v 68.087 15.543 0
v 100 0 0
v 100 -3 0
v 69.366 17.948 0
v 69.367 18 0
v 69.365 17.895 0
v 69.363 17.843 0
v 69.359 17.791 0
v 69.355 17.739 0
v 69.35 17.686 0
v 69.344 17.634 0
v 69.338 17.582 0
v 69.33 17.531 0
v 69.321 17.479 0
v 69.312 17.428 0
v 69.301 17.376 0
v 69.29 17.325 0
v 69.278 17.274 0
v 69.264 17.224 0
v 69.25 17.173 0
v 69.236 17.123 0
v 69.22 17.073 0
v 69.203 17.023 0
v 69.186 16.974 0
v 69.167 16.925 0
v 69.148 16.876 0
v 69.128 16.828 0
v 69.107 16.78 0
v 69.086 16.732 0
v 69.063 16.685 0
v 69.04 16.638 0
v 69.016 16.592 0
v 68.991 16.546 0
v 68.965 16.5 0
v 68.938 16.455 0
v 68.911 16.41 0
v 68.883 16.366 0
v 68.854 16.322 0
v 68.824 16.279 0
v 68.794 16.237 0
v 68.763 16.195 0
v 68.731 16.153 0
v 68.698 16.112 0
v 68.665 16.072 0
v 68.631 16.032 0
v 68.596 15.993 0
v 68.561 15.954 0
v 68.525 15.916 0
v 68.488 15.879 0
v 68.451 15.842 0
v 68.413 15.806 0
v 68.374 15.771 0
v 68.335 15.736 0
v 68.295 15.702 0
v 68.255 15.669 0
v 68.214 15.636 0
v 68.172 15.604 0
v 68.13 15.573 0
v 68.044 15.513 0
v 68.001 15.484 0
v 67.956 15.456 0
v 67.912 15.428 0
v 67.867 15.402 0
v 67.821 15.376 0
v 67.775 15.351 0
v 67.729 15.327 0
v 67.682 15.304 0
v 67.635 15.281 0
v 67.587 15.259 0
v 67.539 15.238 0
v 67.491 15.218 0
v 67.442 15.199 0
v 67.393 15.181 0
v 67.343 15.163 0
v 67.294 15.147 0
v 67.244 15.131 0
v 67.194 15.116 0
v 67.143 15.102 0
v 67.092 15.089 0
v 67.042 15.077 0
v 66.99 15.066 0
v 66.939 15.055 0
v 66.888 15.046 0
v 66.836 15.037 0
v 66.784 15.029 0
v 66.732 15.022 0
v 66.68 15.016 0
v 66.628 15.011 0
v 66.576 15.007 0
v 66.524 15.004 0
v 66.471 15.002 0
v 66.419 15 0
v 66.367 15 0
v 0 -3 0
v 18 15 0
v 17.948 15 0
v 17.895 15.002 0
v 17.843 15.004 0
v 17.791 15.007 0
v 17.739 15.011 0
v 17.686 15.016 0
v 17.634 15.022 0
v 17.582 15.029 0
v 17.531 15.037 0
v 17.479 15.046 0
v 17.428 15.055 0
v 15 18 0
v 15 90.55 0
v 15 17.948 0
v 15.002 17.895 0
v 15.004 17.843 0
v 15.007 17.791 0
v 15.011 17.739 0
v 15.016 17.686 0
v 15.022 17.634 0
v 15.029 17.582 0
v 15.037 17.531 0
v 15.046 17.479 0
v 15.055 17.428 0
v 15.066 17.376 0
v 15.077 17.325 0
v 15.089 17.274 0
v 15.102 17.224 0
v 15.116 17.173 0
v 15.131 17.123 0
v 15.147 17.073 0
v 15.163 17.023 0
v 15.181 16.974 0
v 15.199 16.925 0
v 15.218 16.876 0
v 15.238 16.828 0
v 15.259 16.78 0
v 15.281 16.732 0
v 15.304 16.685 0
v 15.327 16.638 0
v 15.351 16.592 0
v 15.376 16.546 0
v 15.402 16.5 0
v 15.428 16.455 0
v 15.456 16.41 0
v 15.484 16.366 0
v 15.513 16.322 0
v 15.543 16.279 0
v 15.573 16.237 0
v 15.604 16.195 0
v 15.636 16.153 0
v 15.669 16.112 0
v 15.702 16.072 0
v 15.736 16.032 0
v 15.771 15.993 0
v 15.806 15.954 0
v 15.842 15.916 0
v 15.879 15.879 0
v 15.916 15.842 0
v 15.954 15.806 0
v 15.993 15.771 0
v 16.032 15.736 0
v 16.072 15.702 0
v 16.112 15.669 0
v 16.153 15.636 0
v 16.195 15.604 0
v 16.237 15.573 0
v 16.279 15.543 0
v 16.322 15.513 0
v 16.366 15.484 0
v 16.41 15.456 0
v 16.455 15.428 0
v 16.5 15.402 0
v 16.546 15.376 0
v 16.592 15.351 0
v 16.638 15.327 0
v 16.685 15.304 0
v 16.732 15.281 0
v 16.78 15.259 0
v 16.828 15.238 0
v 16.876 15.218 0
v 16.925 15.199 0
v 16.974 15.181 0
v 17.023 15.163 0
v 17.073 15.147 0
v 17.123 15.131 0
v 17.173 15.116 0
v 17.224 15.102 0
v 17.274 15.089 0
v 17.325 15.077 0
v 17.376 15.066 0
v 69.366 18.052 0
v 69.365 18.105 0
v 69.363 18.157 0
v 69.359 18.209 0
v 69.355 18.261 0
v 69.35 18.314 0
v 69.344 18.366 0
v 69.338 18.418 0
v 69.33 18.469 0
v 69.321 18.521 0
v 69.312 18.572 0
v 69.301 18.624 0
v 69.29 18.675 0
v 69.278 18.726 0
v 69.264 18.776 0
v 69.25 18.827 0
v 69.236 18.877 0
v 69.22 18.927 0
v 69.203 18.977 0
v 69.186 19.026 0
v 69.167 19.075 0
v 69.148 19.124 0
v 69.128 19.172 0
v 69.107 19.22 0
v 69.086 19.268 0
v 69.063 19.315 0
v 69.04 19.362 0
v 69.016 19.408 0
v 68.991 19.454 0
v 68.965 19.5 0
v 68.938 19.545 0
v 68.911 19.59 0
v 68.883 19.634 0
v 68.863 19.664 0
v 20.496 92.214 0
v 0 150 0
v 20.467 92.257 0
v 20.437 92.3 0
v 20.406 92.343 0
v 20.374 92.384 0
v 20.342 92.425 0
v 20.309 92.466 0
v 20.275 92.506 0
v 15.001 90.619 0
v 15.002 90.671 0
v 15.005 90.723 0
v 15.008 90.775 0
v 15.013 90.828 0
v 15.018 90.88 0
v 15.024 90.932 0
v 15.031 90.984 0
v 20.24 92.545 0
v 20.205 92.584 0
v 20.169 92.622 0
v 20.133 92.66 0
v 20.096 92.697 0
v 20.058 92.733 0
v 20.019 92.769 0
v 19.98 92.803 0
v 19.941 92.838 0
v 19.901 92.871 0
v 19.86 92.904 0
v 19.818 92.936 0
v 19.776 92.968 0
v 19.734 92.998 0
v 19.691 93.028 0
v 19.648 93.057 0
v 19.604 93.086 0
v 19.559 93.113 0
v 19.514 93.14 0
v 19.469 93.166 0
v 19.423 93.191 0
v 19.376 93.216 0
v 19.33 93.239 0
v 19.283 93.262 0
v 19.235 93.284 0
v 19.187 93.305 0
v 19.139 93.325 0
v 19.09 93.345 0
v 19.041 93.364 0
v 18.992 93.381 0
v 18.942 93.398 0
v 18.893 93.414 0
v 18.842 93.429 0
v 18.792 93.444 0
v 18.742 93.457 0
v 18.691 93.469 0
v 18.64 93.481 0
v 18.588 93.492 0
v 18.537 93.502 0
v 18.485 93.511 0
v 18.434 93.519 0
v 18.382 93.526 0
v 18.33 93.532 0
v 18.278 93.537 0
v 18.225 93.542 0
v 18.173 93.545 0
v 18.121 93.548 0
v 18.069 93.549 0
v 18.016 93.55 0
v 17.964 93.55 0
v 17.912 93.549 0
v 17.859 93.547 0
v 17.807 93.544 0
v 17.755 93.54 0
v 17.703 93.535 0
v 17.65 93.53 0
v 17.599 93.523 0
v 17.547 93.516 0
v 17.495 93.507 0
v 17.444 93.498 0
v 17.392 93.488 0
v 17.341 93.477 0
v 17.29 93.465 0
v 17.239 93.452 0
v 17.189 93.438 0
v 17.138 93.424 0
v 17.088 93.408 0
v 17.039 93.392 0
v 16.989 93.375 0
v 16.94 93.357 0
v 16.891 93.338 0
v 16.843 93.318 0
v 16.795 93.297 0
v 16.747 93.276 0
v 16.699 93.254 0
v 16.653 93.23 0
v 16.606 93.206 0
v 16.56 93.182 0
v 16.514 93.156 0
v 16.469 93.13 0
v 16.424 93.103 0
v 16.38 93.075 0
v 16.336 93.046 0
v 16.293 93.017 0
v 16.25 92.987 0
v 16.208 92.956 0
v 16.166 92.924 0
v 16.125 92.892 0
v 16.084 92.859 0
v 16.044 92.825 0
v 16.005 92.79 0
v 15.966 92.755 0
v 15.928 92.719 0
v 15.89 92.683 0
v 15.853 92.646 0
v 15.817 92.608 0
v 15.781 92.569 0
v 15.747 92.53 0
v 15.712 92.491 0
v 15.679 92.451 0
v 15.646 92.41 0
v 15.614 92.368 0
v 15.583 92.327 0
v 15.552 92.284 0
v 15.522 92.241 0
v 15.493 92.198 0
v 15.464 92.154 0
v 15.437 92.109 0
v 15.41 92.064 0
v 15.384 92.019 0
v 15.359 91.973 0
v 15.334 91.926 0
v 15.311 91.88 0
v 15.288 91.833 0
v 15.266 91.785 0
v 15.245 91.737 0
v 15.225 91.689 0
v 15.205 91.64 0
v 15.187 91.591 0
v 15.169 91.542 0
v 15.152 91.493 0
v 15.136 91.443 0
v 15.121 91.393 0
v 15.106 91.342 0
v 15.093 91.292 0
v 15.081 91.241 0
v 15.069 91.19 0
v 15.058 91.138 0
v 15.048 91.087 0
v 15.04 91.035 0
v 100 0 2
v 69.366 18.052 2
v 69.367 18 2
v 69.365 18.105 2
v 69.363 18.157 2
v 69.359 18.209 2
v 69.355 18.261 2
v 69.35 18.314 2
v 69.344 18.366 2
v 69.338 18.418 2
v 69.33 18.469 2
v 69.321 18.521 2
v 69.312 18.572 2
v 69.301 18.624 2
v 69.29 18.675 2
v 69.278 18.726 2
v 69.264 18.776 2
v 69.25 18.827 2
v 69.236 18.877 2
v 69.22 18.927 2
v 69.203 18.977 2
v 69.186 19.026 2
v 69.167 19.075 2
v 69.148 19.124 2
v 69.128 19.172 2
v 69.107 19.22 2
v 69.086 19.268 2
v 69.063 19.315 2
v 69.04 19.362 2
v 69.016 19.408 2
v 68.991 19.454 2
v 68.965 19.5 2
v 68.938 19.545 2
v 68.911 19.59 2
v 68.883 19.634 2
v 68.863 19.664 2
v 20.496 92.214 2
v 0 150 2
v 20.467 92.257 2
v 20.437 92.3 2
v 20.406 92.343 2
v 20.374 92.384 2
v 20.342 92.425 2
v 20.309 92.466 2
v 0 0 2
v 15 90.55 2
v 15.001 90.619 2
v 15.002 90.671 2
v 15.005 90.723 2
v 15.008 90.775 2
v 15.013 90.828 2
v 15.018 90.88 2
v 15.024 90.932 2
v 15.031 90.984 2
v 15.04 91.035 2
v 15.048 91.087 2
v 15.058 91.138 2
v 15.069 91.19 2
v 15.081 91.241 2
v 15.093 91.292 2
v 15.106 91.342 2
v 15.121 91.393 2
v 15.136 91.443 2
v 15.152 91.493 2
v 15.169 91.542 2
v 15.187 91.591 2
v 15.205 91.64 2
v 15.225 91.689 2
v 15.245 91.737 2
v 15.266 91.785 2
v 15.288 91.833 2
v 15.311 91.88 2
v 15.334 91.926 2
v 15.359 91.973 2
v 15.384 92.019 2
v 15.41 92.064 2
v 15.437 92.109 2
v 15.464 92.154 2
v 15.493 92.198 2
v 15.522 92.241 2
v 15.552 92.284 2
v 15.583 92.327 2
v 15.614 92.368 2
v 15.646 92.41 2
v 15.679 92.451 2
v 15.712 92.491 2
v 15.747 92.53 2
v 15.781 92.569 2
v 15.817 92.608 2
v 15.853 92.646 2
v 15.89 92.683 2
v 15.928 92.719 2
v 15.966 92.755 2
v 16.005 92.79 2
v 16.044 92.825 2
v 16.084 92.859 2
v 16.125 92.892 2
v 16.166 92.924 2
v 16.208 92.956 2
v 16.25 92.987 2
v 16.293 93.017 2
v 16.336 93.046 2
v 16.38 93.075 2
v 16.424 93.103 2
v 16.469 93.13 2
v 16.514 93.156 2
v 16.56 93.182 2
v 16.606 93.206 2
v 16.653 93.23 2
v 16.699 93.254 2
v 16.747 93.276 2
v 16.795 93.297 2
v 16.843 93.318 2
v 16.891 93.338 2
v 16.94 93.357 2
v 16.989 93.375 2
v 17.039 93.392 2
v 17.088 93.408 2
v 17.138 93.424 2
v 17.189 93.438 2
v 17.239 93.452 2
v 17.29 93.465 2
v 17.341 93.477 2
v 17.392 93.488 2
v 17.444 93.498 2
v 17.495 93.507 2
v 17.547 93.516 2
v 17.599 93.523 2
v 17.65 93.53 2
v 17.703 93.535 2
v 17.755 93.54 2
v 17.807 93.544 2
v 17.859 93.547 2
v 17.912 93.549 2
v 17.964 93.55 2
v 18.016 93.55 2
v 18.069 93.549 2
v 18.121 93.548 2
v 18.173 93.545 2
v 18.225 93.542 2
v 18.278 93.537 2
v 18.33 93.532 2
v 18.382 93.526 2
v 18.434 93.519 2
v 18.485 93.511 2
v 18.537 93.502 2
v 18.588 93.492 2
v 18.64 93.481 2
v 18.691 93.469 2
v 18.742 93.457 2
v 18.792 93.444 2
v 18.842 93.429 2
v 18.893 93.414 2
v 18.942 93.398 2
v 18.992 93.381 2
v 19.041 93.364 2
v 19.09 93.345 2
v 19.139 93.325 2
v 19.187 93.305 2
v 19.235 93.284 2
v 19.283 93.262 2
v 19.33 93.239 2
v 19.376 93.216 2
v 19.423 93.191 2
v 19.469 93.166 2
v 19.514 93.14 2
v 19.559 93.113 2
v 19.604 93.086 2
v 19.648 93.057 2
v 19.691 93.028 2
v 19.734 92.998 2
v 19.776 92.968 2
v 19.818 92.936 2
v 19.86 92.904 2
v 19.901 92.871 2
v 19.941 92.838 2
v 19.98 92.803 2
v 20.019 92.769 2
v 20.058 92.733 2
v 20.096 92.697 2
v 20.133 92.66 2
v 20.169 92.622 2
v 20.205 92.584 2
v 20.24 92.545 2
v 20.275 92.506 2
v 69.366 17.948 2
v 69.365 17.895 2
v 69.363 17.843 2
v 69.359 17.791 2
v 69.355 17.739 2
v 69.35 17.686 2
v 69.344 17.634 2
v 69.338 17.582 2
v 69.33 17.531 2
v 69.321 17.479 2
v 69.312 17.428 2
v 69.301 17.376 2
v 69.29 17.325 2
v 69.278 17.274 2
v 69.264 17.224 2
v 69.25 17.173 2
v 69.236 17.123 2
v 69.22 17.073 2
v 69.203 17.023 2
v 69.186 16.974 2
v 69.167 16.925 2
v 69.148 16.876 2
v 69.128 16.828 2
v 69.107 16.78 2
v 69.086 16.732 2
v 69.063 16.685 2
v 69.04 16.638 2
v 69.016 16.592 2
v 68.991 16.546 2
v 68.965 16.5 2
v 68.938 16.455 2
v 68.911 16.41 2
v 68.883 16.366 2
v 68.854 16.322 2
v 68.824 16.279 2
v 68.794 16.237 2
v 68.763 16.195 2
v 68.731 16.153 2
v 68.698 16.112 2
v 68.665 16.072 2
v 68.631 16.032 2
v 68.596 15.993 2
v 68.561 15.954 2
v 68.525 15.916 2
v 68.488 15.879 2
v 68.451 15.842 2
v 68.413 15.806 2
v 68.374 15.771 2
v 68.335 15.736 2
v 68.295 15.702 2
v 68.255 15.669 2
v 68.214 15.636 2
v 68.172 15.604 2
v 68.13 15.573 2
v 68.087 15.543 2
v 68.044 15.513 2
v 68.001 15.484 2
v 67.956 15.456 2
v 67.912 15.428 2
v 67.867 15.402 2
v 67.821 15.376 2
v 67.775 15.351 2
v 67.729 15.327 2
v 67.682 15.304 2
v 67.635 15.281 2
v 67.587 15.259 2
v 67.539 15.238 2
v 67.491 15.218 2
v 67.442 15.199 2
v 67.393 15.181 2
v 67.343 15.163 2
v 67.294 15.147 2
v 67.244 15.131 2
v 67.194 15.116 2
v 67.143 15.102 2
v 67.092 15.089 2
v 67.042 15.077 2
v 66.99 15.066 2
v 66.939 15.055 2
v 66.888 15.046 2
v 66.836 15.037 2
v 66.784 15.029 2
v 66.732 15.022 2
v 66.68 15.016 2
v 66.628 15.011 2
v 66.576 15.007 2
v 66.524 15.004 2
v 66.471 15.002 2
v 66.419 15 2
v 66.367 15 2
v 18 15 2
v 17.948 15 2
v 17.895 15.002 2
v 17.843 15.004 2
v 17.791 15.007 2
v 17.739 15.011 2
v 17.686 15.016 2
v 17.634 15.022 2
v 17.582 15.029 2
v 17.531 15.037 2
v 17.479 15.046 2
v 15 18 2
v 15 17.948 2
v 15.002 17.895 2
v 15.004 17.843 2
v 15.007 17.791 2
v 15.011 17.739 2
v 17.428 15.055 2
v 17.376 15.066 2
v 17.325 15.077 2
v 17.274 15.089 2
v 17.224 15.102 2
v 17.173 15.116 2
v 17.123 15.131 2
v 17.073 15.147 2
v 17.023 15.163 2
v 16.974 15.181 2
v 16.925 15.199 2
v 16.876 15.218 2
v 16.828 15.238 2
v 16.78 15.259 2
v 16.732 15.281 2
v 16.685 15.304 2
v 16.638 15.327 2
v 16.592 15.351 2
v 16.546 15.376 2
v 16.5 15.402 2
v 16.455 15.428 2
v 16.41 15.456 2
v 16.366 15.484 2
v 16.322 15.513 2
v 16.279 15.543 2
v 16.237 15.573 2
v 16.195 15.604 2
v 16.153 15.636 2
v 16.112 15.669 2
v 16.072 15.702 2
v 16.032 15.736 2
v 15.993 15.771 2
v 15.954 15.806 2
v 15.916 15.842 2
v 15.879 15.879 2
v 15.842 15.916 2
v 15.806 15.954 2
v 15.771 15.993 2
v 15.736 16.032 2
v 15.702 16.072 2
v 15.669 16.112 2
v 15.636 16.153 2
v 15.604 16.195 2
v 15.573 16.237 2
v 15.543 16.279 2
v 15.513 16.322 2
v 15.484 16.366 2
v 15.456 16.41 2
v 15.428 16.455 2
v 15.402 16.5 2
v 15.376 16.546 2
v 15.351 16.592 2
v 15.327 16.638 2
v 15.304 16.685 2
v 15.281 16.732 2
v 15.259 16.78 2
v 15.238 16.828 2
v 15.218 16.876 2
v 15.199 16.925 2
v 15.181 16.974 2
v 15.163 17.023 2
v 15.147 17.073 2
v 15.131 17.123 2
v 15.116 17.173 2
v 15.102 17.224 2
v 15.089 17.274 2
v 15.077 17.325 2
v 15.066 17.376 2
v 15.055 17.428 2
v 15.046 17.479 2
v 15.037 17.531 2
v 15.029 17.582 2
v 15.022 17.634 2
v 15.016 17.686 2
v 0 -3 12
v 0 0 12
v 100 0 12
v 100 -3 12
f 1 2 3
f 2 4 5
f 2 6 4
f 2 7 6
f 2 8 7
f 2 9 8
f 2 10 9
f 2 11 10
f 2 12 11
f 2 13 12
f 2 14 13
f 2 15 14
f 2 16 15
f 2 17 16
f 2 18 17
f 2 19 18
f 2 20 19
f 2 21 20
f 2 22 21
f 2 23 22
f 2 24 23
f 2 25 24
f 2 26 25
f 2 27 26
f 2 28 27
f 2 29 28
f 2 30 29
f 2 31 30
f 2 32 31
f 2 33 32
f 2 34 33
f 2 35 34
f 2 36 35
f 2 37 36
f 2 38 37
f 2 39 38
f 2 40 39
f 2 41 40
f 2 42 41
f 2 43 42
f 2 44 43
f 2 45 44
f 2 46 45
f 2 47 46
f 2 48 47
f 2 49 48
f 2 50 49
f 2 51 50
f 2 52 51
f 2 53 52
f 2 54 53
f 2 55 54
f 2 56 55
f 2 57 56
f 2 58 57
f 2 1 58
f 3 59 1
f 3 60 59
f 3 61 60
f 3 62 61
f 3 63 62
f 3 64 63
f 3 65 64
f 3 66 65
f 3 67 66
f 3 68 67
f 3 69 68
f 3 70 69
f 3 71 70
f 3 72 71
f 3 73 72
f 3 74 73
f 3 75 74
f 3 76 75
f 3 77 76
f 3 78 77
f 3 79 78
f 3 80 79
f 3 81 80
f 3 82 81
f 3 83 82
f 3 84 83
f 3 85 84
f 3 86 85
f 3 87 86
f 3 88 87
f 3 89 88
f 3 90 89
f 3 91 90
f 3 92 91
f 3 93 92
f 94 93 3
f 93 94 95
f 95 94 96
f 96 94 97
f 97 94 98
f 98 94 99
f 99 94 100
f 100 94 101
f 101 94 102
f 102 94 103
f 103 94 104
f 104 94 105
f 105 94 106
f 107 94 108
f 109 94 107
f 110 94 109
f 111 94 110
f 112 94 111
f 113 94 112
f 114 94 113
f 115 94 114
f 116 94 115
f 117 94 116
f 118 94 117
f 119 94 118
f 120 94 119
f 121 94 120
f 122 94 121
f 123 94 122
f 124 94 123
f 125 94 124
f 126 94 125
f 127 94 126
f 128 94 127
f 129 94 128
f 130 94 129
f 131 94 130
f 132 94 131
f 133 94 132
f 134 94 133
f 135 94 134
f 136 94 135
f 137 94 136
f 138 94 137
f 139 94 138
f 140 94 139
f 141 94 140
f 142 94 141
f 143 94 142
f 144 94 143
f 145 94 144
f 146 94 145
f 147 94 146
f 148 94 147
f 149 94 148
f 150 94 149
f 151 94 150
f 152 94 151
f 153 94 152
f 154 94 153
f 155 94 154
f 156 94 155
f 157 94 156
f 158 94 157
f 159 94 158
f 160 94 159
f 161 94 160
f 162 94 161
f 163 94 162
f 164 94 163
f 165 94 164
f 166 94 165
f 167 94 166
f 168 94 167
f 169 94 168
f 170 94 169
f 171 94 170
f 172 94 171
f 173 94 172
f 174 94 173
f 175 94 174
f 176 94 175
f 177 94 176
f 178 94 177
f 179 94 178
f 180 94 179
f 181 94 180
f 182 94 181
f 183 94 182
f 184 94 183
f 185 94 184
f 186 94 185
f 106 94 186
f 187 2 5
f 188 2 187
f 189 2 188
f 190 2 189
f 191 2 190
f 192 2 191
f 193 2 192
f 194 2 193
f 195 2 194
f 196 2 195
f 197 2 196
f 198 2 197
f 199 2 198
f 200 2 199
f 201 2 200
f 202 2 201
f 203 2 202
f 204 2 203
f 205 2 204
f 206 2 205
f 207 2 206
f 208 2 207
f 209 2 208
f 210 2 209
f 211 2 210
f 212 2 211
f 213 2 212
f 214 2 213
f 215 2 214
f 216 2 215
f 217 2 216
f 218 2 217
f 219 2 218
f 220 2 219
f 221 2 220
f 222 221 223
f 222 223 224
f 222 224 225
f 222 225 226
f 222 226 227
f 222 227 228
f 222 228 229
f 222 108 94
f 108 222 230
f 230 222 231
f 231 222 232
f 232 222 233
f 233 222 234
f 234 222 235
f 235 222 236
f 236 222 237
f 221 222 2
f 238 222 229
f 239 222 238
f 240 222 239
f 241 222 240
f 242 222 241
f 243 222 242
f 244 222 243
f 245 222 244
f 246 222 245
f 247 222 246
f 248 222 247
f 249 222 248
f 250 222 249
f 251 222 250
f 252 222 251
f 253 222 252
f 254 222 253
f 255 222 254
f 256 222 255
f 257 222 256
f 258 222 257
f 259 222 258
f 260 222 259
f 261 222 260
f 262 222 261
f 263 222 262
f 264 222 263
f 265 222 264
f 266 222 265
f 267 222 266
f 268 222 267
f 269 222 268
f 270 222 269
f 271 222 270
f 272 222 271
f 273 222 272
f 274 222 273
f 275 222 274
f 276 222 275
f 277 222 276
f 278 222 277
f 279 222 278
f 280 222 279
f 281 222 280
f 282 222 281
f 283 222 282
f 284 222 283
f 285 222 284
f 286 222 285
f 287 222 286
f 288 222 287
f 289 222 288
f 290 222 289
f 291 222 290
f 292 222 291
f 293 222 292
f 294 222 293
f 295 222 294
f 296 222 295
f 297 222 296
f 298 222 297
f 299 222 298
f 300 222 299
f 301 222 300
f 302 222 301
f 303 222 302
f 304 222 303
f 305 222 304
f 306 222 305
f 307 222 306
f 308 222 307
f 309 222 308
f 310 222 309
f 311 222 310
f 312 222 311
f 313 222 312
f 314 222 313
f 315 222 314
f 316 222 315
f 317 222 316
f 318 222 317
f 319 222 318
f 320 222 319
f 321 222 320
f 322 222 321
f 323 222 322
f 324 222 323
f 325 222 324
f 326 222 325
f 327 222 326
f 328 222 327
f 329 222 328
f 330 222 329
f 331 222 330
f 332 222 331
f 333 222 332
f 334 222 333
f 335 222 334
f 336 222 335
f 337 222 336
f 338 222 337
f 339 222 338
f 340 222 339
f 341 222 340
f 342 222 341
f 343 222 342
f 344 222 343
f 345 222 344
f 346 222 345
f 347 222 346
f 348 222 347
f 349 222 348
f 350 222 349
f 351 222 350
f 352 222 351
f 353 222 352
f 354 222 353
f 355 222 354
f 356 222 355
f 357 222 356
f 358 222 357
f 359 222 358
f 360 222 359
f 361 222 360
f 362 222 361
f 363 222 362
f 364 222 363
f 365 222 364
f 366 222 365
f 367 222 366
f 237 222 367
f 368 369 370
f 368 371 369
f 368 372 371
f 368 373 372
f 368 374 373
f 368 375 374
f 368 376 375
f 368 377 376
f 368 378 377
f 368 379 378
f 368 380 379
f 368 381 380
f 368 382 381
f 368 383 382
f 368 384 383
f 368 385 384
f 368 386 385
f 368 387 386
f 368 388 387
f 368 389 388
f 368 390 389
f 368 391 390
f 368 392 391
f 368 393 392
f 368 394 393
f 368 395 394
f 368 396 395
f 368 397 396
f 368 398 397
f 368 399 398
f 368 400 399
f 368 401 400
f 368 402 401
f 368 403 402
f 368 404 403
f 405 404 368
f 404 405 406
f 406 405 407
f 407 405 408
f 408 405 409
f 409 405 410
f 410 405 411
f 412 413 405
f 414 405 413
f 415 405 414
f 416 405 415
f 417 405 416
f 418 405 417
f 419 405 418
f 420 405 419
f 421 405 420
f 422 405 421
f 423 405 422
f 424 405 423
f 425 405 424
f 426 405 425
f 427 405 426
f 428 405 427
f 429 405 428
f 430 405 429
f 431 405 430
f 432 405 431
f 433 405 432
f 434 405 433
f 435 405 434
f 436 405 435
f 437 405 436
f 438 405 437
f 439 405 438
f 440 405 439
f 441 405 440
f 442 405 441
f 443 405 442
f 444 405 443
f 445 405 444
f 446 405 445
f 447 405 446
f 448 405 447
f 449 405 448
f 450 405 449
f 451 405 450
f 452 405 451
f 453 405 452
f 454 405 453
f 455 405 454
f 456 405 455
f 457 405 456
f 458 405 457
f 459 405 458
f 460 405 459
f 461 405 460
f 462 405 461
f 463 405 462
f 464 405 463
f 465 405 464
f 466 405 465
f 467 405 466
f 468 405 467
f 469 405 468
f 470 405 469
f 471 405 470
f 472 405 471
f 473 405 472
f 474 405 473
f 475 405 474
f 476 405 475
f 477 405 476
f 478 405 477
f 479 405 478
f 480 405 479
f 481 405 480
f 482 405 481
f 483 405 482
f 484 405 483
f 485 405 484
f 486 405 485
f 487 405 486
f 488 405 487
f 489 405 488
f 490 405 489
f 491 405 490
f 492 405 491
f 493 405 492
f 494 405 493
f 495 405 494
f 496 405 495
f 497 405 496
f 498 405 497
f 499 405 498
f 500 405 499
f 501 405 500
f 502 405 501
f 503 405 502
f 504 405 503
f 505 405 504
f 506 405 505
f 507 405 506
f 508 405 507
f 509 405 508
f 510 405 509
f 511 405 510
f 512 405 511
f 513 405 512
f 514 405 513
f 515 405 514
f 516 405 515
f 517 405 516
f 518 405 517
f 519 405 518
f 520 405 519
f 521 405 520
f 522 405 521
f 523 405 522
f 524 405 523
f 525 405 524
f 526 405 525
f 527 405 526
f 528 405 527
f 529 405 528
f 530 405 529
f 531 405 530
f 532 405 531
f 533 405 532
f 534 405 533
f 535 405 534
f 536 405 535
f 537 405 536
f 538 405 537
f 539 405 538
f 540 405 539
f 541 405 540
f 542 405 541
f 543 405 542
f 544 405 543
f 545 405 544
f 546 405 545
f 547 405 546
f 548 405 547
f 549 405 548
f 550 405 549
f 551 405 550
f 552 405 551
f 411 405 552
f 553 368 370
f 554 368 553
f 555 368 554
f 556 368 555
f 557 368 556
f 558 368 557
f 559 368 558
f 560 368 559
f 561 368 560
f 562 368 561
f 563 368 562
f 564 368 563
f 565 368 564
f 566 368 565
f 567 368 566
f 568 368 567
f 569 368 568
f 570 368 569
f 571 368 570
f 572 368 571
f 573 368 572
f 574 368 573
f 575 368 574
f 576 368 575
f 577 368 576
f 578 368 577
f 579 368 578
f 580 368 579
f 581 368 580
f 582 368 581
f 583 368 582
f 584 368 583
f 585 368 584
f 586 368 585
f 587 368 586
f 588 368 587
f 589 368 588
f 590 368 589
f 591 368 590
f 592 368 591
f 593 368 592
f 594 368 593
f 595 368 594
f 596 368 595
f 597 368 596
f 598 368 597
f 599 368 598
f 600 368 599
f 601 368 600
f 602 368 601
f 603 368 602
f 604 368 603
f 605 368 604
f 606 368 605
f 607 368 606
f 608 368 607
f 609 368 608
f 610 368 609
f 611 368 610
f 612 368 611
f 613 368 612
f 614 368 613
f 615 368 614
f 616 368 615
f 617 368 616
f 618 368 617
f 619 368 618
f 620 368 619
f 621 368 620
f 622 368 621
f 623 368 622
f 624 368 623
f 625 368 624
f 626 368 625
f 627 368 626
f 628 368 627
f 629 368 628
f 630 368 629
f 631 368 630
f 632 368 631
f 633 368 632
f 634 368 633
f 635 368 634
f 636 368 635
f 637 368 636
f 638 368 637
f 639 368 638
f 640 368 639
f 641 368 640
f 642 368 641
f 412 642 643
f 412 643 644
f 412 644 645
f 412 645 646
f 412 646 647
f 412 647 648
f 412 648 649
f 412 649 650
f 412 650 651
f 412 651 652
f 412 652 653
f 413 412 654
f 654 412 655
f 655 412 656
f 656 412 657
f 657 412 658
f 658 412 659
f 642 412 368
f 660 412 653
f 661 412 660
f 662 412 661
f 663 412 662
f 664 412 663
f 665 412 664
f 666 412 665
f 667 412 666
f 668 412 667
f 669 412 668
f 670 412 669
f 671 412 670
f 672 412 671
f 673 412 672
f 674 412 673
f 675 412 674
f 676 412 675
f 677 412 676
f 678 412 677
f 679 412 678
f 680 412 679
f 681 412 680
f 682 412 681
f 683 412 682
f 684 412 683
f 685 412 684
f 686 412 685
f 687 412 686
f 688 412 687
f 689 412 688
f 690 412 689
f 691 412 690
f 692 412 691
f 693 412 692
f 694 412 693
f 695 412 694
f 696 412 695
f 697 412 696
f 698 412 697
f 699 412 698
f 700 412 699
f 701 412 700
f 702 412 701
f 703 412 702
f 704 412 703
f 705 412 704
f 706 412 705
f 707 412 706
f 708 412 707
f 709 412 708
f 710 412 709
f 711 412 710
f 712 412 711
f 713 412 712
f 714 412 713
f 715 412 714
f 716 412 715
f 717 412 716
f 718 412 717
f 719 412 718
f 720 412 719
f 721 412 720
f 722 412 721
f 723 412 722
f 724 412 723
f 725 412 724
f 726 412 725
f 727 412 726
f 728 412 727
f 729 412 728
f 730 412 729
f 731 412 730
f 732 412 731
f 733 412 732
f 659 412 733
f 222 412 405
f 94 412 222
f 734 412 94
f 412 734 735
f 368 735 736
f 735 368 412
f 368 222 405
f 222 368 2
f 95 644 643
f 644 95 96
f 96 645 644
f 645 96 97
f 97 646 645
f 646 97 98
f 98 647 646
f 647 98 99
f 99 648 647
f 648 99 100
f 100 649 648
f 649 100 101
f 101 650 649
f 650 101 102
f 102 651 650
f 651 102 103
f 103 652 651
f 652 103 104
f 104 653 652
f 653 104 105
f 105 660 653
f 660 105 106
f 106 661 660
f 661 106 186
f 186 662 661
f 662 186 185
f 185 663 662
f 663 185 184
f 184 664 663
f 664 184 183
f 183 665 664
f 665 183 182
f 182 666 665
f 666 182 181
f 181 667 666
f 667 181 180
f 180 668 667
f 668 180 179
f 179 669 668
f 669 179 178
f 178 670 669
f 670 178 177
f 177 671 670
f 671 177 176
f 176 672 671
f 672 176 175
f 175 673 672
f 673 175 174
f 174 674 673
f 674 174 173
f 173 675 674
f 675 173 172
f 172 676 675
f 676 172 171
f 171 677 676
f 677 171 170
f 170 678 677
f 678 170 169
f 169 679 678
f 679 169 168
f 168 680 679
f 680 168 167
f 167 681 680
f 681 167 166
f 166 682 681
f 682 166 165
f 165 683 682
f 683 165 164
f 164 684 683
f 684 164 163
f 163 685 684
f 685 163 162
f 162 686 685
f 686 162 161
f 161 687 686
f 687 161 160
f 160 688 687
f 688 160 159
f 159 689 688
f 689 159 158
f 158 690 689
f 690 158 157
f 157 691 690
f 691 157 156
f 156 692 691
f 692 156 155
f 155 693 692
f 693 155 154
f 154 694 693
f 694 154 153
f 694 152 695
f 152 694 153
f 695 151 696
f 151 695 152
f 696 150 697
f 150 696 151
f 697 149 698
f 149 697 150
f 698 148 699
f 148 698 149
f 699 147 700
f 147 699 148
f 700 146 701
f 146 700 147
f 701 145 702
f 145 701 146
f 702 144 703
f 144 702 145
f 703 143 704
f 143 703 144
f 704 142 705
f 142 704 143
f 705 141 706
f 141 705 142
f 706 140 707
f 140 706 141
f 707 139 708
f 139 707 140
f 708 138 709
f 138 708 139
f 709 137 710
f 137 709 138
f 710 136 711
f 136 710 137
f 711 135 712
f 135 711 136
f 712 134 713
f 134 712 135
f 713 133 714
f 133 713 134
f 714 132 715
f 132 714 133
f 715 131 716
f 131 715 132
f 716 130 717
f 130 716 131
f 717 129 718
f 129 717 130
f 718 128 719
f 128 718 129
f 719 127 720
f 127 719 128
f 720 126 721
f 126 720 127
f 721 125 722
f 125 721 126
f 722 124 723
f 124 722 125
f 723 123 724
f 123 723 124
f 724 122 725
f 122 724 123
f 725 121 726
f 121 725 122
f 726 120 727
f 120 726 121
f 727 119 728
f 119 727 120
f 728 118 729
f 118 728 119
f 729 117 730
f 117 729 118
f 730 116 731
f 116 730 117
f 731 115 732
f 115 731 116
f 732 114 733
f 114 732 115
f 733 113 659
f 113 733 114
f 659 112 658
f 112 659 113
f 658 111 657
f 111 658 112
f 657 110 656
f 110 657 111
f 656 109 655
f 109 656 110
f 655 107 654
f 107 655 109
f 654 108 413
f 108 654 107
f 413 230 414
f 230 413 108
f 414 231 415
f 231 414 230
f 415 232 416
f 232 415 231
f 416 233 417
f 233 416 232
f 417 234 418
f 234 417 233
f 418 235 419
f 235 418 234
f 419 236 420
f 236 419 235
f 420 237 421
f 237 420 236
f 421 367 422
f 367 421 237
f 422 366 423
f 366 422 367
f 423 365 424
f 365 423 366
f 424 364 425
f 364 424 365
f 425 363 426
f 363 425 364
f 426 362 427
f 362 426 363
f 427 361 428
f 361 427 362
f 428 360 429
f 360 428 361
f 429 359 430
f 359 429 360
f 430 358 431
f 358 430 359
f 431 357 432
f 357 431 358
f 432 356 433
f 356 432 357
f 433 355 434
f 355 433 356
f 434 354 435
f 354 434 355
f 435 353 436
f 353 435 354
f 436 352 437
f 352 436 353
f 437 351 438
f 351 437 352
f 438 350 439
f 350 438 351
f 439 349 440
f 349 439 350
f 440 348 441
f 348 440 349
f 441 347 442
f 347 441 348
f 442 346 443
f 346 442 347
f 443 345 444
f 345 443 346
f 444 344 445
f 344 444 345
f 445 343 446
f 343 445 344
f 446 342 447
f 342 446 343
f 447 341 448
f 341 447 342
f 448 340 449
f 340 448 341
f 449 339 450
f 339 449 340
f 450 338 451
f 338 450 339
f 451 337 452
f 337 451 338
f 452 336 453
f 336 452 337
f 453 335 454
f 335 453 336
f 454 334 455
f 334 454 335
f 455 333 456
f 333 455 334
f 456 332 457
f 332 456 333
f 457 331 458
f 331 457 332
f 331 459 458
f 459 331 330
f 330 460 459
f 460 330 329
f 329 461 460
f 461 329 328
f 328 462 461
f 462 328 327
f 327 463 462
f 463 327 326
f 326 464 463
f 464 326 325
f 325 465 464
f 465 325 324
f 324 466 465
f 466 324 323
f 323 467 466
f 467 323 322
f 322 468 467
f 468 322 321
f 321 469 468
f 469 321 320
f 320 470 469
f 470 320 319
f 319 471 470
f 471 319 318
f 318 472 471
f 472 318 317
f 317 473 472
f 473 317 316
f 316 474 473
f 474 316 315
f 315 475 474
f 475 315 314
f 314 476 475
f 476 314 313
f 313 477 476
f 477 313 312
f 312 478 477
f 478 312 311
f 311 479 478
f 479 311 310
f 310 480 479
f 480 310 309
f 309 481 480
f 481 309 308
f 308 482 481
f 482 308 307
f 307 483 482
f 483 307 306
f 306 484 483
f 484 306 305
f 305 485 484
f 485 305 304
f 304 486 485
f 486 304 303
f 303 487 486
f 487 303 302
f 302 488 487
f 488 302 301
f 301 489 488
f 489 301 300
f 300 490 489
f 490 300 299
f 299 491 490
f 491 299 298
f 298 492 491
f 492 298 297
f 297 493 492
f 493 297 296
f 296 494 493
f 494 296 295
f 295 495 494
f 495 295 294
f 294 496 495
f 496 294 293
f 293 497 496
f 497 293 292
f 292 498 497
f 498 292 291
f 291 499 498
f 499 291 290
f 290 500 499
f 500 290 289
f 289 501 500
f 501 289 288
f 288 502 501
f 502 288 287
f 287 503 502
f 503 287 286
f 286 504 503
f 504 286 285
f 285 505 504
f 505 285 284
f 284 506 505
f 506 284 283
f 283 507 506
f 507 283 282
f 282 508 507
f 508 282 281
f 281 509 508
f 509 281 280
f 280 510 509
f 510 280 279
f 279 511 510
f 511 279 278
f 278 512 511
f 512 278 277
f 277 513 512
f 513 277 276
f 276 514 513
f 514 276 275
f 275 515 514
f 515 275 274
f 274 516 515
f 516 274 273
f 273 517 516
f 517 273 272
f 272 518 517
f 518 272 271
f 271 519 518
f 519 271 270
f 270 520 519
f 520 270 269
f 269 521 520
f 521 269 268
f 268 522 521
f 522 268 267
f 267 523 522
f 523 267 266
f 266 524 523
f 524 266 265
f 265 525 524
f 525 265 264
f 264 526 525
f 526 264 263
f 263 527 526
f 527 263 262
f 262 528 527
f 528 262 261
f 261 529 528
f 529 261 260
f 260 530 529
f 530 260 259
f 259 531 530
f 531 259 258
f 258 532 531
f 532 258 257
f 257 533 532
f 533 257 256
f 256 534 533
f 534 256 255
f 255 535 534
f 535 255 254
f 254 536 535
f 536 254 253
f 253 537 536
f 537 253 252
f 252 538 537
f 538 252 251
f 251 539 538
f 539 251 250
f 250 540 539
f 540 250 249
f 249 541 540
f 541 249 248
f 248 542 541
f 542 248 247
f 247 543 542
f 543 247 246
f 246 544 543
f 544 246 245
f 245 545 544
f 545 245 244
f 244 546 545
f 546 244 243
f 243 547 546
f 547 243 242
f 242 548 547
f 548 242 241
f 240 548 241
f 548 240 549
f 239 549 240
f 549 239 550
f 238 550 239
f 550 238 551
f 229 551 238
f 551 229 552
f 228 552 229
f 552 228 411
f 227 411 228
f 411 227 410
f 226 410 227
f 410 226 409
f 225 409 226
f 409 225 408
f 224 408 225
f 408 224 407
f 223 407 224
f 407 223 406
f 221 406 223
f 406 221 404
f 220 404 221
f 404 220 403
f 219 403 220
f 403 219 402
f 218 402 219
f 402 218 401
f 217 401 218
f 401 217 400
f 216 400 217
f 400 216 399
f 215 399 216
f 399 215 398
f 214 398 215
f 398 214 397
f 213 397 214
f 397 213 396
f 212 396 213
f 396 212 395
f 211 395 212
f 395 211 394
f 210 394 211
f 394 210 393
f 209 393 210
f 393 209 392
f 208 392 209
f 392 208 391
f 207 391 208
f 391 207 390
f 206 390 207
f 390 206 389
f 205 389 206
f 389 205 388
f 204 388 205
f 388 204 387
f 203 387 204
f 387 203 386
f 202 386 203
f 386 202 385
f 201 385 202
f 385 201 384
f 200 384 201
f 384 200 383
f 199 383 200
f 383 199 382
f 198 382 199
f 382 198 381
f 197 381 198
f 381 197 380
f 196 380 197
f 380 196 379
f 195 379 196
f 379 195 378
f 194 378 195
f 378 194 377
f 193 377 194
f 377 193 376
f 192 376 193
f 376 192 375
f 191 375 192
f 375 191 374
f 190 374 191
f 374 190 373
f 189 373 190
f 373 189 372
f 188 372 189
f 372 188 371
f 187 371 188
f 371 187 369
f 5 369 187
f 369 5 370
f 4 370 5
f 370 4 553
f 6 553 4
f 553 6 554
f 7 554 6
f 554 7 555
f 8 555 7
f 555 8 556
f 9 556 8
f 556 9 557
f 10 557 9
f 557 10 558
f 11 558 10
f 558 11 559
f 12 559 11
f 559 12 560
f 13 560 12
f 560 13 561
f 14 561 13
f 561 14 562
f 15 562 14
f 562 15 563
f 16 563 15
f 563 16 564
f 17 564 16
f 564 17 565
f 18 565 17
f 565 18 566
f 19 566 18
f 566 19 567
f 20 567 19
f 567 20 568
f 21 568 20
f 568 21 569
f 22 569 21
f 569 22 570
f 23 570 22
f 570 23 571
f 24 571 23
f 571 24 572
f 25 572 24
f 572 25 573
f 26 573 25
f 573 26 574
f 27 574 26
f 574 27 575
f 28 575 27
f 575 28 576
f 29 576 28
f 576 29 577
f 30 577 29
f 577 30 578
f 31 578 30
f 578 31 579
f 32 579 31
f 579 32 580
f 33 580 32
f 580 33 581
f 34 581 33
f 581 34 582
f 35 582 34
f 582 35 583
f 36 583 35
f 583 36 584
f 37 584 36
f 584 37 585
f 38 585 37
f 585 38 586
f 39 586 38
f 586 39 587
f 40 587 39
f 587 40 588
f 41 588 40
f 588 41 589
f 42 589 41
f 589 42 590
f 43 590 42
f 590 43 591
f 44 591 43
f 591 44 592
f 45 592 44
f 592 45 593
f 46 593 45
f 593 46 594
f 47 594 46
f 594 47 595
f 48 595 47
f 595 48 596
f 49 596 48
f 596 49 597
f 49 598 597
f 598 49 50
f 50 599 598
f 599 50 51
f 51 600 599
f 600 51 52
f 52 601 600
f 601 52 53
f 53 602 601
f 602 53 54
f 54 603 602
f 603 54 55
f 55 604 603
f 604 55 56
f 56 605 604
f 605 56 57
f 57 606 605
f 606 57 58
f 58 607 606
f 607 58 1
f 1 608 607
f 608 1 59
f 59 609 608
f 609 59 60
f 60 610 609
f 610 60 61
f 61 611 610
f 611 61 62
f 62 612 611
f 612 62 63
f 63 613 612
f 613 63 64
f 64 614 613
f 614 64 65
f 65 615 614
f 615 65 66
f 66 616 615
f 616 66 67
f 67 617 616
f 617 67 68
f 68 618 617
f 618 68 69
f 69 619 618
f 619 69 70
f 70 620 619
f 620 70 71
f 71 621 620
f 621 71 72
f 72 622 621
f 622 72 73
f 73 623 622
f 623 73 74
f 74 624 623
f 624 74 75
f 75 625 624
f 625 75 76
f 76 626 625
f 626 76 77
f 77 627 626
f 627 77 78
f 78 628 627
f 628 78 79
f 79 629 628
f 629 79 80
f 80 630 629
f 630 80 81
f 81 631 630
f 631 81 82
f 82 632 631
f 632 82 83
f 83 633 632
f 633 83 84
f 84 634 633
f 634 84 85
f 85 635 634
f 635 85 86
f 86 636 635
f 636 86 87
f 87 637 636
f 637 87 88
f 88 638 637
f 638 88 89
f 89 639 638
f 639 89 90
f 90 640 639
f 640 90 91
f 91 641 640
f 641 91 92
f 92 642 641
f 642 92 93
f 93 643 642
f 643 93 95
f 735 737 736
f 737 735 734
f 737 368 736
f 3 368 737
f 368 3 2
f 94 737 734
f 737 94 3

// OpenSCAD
x = 100;
y = 150;
h = 2;

edge_thickness = 3;
edge_height = 10;

inset = 15;
inset_padding = 3;

color("red") {
    // triangle base
    linear_extrude(height=h)
        difference() {
            // main base
            resize([x,y]) polygon(points=[[0,0],[1,0],[0,1]]);
          
            // subtract instep to reduce print time
            offset(r=inset_padding, $fn=360) // then increase by padding to get rounded internal corners
                offset(r=-inset-inset_padding) // overreduce by the inset amount and padding
                    resize([x,y]) polygon(points=[[0,0],[1,0],[0,1]]);

            
        }

    // straight edge
    linear_extrude(height=h+edge_height)
        translate([0,-edge_thickness,0])
            square([x,edge_thickness]);
}    
    
//color("red")
//    offset(r=inset_padding, $fn=360) // then increase by padding to get rounded internal corners
//        offset(r=-inset-inset_padding) // overreduce by the inset amount and padding
//            resize([x,y]) polygon(points=[[0,0],[1,0],[0,1]]);

//color("blue")
//    offset(delta=-inset, chamfer=true)
//        resize([x,y]) polygon(points=[[0,0],[1,0],[0,1]]);
        
